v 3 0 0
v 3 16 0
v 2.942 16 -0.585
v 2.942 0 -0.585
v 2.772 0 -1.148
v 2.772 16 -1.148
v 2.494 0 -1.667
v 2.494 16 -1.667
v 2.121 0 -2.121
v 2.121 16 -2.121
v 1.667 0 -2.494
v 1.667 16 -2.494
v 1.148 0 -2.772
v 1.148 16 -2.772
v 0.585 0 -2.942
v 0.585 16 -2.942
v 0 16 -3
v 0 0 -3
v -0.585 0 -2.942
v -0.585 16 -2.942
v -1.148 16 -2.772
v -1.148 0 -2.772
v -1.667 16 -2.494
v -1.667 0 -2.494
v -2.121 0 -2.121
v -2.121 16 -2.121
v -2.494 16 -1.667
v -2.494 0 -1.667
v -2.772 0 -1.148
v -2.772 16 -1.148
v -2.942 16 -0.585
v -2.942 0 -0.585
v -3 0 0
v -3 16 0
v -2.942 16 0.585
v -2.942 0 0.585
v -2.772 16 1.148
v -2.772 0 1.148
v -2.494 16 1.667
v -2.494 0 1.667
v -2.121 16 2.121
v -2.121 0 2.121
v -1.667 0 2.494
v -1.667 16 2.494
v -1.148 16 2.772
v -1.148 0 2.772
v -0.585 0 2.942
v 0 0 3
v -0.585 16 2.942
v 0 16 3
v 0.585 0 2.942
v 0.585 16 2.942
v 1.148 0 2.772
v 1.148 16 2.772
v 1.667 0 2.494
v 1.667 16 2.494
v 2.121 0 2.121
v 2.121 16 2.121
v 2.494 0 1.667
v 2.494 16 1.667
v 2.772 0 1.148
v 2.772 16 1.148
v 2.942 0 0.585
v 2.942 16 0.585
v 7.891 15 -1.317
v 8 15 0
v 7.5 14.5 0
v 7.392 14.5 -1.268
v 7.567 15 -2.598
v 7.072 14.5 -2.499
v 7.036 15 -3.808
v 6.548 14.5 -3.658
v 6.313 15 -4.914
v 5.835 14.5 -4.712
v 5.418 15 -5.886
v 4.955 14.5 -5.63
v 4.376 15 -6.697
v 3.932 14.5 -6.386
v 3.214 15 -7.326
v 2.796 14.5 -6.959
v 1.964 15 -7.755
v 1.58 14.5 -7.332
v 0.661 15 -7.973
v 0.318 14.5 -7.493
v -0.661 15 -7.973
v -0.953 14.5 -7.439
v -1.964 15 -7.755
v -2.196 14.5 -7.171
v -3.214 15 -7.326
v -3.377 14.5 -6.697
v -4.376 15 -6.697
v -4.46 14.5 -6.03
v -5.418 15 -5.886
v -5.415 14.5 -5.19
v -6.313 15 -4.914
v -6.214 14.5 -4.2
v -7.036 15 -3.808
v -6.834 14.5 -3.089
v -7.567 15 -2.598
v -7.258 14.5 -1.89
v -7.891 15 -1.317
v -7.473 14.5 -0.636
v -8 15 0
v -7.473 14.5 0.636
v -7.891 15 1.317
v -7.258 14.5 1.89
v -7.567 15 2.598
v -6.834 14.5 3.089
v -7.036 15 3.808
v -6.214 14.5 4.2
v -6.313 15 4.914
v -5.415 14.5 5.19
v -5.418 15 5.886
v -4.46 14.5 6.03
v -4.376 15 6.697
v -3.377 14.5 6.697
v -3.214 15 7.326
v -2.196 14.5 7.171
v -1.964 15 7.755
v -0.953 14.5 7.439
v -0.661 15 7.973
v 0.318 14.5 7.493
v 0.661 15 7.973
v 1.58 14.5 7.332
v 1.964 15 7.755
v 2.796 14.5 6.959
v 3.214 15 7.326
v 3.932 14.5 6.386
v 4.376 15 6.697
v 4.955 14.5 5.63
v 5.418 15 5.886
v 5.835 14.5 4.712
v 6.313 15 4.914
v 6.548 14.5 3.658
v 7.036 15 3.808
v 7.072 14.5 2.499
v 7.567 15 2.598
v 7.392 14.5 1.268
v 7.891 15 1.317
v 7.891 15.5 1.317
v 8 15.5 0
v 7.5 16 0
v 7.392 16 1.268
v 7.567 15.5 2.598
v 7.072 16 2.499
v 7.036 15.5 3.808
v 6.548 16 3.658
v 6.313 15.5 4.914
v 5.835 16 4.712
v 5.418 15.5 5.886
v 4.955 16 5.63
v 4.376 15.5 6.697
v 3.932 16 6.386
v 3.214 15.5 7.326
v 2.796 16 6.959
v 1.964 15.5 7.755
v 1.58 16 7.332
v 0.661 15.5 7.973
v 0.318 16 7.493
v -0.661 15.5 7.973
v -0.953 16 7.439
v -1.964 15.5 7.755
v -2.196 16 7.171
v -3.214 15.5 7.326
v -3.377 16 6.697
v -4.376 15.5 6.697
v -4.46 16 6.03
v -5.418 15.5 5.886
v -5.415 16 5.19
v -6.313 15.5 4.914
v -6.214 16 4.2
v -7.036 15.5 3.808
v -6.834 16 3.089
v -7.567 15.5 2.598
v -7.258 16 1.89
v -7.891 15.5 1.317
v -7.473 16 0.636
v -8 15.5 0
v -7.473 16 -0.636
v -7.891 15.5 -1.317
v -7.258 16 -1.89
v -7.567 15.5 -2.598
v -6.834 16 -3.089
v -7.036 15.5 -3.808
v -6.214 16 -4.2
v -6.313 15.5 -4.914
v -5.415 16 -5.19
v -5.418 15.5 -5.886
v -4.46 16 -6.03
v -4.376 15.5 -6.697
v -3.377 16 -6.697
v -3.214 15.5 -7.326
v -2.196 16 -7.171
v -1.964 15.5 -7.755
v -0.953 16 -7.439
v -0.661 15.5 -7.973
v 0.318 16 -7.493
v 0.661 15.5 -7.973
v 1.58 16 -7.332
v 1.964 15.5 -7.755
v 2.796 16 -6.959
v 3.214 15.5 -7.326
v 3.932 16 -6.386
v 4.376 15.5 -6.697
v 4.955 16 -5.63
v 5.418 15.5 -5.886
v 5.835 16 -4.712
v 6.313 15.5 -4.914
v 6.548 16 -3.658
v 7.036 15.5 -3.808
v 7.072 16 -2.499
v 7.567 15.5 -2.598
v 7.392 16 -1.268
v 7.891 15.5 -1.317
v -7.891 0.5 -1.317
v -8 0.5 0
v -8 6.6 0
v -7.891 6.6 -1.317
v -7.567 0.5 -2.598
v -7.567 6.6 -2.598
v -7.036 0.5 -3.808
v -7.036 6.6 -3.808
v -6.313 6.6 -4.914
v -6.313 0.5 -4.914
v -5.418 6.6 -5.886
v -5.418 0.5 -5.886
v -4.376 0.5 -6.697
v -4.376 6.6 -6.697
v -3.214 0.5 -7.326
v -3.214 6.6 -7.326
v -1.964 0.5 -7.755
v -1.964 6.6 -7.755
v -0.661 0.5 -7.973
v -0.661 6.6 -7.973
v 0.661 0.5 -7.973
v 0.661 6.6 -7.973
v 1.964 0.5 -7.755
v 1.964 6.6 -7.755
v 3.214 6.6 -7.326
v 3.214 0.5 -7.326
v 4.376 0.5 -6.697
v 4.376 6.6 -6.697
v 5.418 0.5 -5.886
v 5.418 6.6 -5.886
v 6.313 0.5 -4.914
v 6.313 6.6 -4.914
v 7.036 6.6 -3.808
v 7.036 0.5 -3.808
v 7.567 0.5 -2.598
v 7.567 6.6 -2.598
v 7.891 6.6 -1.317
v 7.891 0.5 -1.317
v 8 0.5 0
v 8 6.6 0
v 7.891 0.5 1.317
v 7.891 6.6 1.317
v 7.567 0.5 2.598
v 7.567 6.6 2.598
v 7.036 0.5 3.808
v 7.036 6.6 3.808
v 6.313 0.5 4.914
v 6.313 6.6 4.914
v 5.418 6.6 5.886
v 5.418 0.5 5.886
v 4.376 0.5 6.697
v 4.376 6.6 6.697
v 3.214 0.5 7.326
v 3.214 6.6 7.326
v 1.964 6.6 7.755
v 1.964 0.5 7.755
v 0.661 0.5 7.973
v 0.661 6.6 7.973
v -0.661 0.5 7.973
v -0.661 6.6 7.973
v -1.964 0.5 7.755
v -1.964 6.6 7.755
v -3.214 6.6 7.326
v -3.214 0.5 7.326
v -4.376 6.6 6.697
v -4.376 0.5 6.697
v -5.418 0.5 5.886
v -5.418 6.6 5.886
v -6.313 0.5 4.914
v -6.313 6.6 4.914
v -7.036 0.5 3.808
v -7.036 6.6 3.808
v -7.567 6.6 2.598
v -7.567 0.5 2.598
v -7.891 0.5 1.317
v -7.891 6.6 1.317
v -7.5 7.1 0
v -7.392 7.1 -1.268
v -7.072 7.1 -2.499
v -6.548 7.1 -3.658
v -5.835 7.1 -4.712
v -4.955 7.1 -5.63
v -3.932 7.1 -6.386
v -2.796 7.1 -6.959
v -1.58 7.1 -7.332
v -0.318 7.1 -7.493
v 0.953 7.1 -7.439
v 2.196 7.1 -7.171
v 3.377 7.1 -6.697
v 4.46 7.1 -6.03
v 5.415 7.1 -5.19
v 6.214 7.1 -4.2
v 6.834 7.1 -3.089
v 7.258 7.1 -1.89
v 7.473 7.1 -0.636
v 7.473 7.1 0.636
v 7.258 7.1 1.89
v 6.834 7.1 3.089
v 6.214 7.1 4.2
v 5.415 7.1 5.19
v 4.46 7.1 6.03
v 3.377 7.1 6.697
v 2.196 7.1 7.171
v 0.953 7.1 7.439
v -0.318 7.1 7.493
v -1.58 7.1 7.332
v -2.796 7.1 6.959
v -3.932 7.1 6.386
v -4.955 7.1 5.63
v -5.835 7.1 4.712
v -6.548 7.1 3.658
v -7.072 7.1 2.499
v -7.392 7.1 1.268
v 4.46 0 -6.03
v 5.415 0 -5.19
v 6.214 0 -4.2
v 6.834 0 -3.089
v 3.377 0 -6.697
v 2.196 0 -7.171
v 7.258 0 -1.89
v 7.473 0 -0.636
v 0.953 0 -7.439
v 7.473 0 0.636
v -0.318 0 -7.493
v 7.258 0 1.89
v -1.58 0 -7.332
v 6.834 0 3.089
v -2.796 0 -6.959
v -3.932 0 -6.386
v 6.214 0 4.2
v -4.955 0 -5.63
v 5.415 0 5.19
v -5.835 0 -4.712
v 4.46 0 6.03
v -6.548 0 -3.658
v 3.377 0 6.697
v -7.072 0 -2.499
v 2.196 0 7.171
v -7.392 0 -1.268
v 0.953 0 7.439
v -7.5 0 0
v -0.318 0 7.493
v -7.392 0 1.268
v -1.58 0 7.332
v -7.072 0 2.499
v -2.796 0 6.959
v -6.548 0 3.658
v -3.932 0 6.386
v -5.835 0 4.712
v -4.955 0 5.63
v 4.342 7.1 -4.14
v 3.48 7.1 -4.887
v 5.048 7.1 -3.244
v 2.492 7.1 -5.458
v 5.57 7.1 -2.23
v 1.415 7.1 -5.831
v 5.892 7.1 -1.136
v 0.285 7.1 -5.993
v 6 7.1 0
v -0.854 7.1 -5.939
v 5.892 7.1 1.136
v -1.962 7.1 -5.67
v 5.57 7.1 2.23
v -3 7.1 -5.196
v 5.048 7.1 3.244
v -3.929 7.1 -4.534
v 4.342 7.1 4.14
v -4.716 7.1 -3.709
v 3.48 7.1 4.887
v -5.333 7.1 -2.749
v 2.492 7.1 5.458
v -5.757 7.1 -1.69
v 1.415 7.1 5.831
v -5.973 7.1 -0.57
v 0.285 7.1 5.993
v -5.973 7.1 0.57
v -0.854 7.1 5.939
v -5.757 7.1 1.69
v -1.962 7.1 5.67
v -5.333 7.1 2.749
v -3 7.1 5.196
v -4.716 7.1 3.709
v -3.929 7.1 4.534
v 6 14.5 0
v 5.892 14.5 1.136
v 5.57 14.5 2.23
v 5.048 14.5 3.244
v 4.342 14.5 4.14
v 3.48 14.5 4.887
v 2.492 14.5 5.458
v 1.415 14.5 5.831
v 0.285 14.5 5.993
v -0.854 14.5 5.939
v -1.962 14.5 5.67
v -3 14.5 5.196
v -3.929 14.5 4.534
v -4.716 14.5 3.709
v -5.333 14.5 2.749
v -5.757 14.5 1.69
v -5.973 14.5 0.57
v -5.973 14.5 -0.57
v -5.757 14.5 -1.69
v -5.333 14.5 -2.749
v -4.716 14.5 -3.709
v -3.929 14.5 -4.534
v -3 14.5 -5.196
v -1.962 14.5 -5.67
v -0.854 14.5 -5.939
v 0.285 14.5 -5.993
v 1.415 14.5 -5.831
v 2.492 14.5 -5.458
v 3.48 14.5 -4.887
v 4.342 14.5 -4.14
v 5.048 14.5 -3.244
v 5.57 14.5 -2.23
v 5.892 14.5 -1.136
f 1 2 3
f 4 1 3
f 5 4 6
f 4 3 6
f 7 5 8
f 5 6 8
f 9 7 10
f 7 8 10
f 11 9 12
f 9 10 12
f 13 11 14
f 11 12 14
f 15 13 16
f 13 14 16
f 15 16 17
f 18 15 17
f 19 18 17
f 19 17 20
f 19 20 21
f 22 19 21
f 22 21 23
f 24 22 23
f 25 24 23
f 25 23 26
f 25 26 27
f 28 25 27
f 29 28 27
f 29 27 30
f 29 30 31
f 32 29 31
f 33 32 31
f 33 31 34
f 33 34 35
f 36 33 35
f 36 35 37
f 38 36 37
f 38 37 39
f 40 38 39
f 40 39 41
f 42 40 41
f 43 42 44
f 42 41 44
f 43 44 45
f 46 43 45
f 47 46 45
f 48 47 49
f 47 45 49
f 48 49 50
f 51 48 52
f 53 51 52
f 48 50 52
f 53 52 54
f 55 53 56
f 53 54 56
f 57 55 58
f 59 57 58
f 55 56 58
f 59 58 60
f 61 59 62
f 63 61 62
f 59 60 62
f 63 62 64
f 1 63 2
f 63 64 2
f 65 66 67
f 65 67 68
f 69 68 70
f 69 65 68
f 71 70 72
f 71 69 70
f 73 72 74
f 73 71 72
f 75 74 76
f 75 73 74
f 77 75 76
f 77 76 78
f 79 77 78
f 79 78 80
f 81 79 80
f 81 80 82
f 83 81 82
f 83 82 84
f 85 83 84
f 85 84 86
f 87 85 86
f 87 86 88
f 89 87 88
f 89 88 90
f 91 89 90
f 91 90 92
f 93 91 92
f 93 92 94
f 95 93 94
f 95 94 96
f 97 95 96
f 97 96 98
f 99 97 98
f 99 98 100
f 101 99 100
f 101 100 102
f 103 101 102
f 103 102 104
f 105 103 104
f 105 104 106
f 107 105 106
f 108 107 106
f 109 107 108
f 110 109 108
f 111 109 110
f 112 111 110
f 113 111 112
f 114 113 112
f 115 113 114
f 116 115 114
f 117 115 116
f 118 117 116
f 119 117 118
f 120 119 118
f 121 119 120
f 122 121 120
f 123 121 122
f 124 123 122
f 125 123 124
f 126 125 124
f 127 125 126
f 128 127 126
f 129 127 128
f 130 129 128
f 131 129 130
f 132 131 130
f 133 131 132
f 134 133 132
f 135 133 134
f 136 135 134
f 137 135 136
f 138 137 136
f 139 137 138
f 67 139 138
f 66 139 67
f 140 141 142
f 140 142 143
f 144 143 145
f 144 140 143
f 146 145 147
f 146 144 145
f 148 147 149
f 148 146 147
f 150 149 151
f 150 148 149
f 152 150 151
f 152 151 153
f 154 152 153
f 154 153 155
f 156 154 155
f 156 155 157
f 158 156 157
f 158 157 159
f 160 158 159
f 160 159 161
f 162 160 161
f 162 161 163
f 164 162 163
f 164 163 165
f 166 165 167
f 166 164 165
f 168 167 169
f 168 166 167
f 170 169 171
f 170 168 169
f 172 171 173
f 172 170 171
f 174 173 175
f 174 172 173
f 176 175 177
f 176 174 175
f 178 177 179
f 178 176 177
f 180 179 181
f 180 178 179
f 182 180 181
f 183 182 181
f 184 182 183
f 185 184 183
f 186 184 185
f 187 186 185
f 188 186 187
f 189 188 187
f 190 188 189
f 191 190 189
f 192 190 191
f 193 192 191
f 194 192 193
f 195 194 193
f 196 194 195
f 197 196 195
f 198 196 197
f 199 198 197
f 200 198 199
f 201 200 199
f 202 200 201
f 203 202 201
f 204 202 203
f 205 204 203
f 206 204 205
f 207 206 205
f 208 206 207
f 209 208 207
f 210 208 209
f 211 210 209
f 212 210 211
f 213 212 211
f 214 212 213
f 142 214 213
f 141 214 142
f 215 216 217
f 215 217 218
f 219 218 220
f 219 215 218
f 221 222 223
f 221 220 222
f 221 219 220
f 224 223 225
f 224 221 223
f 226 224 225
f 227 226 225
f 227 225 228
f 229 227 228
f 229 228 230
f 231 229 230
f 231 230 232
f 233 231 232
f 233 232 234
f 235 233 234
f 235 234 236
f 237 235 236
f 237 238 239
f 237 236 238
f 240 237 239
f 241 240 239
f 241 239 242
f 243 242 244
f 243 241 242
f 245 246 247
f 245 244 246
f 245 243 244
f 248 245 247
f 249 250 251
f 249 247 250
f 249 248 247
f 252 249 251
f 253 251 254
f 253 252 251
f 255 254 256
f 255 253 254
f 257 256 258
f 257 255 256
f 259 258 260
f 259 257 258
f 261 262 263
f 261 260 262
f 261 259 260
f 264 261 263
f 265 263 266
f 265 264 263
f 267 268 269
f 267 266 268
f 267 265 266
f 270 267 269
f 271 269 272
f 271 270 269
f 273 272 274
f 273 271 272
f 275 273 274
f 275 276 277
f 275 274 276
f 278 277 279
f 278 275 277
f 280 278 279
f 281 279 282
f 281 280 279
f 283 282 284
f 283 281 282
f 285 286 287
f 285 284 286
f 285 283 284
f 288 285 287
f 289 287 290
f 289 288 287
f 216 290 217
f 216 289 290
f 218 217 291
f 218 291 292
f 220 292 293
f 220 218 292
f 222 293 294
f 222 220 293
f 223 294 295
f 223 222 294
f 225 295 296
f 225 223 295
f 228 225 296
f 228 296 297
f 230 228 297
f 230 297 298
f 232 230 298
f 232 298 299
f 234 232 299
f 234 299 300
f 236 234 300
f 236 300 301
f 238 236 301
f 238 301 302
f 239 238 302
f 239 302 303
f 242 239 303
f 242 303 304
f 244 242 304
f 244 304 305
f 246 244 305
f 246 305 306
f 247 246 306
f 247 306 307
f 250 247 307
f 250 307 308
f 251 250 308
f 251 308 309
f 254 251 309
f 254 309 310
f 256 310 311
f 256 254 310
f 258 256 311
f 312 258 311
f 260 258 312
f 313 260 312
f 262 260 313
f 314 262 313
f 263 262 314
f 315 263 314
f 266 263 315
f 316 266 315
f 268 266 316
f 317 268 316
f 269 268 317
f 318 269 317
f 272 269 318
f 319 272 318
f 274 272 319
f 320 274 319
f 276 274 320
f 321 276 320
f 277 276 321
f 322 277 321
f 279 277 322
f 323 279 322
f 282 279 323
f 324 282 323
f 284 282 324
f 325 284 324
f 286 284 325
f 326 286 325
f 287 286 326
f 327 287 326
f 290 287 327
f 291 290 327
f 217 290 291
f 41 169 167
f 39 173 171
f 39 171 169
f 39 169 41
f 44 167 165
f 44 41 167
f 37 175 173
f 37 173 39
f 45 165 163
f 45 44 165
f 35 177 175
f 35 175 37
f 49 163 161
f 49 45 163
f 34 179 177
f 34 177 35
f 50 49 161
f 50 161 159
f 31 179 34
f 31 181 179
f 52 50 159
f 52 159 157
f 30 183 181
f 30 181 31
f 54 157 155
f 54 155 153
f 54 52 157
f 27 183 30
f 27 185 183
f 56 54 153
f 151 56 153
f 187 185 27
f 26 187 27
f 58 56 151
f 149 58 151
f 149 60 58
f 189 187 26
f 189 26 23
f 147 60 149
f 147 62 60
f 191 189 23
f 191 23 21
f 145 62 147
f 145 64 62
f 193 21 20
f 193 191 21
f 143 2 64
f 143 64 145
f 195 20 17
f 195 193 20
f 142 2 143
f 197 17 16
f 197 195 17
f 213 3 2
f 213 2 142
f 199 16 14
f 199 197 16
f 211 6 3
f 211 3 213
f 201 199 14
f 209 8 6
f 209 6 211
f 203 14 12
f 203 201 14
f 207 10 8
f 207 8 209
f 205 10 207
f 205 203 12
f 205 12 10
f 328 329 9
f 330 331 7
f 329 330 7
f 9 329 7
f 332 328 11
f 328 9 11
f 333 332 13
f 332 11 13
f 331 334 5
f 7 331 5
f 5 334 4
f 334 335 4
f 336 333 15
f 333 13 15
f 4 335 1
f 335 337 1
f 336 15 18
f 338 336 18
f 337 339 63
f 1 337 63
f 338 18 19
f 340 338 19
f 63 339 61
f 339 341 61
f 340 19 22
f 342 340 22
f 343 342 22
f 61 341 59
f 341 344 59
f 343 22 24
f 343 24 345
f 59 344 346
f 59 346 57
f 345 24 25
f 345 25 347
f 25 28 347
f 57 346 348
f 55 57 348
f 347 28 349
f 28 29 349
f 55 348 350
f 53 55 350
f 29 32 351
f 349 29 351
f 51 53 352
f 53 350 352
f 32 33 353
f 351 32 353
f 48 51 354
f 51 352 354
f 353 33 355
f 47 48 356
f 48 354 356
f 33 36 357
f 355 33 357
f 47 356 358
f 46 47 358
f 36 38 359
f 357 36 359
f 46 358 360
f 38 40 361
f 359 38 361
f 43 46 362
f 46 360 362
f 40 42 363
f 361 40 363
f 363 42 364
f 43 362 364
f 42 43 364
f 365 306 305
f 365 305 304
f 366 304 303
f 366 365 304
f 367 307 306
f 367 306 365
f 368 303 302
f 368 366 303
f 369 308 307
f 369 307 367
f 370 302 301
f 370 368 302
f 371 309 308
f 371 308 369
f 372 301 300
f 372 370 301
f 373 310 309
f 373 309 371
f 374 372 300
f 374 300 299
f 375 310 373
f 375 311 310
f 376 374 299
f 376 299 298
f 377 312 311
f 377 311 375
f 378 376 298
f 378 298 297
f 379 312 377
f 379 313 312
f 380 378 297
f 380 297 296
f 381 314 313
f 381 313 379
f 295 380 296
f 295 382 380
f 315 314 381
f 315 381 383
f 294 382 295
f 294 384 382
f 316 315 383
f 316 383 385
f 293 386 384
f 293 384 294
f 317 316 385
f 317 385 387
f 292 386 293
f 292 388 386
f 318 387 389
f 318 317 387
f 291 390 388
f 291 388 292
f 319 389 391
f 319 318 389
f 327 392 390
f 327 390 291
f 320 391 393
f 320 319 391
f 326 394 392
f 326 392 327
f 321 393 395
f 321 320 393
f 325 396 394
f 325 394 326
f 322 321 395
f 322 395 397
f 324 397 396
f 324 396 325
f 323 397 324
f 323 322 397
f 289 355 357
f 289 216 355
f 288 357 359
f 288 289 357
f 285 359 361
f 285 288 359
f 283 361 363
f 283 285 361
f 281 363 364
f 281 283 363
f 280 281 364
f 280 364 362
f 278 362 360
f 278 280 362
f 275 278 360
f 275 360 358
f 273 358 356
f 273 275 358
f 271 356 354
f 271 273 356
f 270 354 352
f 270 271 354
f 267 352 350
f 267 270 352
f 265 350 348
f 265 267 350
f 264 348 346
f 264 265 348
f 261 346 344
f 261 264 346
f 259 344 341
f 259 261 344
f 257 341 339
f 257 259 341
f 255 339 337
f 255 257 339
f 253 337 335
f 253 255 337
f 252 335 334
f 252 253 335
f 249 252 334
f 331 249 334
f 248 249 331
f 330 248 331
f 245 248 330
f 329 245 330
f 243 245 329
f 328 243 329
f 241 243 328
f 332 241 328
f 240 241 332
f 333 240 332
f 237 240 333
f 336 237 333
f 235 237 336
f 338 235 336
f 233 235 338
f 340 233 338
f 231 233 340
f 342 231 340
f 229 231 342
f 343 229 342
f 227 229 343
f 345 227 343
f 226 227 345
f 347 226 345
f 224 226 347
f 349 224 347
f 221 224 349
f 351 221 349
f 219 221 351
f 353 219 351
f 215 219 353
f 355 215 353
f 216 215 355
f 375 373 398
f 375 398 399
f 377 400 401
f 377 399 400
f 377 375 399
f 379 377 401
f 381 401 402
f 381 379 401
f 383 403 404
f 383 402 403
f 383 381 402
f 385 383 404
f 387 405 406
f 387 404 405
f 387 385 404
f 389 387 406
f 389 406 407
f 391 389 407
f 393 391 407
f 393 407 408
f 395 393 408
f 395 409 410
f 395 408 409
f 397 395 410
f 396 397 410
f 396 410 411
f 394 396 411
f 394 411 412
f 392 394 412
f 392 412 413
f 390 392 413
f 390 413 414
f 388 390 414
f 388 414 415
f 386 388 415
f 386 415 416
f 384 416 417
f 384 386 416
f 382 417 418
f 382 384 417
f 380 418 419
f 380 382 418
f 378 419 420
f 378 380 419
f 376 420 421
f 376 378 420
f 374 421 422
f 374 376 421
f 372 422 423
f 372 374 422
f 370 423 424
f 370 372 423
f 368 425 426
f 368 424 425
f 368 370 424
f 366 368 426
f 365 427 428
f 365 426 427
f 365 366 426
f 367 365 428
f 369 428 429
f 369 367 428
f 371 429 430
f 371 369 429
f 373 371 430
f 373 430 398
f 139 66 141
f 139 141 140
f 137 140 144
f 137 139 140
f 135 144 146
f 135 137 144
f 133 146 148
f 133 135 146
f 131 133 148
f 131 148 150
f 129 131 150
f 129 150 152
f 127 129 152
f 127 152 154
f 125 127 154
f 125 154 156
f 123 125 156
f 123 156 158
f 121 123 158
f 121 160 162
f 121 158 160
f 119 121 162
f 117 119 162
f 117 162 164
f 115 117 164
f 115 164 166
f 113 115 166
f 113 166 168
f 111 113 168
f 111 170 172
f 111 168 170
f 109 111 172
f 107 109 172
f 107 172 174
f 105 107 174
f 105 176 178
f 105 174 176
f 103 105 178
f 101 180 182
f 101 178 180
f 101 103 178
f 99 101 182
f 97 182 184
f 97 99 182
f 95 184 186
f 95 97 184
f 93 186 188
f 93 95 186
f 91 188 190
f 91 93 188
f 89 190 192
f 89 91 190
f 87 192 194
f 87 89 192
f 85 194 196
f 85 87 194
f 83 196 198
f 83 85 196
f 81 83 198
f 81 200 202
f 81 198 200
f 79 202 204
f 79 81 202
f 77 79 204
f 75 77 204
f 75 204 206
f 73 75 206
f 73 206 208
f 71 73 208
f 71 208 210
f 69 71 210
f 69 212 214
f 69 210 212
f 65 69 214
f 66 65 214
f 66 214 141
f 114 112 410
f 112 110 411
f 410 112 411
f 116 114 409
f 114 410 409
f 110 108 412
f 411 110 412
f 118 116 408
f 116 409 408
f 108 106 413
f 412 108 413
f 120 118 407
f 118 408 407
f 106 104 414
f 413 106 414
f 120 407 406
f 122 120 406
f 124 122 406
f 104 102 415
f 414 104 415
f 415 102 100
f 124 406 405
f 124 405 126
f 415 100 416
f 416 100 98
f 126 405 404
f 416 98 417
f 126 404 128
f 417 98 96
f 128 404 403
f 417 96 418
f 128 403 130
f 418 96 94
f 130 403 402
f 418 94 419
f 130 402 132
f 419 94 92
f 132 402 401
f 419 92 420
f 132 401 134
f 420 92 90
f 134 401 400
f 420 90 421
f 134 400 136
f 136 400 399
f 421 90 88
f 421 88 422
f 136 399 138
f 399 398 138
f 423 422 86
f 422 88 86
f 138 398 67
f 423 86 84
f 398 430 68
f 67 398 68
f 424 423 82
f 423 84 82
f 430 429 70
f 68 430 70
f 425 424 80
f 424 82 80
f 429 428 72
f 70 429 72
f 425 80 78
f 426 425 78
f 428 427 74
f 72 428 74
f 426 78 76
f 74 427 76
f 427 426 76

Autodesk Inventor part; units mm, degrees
ref_plane "YZ Plane" through (0, 0, 0) normal (1, 0, 0) x (0, 1, 0)
ref_plane "XZ Plane" through (0, 0, 0) normal (0, 1, 0) x (-1, 0, 0)
ref_plane "XY Plane" through (0, 0, 0) normal (0, 0, 1) x (1, 0, 0)
sketch "Sketch1" plane through (0, 0, 0) normal (0, 1, 0) x (-1, 0, 0)
  circle A0 centre (0, 0) radius 8
  dimension "d0" = 16
extrude "Extrusion1" add sketch "Sketch1" along normal blind 7.1
sketch "Sketch2" plane through (0, 7.1, 0) normal (0, 1, 0) x (1, 0, 0)
  circle A0 centre (0, 0) radius 6
  dimension "d3" = 12
extrude "Extrusion2" add sketch "Sketch2" along normal blind 7.4
sketch "Sketch3" plane through (0, 14.5, 0) normal (0, 1, 0) x (1, 0, 0)
  circle A0 centre (0, 0) radius 8 projected
extrude "Extrusion3" add sketch "Sketch3" along normal blind 1.5
chamfer "Chamfer1" distance 0.5 angle 45 4 edges at (-8, 16, 0) (-8, 14.5, 0) (8, 7.1, 0) (8, 0, 0)
sketch "Sketch4" plane through (0, 16, 0) normal (0, 1, 0) x (1, 0, 0)
  circle A0 centre (0, 0) radius 3
  dimension "d11" = 6
extrude "Extrusion4" cut sketch "Sketch4" against normal blind 16
properties part number "2GT_wheel"
